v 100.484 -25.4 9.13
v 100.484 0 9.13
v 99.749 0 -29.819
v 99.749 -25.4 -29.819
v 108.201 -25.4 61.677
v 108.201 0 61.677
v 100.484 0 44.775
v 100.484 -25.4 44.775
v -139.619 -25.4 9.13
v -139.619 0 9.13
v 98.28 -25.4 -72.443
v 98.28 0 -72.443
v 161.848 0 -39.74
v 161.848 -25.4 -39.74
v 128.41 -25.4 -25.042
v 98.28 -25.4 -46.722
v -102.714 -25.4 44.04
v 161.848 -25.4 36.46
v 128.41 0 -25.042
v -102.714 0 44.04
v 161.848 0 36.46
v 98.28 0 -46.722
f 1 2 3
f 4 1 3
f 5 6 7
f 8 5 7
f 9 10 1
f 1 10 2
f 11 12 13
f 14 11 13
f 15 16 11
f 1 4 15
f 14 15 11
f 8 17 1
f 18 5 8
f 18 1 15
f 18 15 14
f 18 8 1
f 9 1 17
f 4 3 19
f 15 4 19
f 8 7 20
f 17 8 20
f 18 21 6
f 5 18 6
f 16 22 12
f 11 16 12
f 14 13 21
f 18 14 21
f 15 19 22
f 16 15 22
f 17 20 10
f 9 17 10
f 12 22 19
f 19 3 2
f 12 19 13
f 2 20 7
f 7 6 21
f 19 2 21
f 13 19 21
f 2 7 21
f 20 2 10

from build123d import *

# Parameters (mm, degrees)
F1_DEPTH = 25.4


with BuildPart() as f1:
    # F0 (on Front) → F1 (new body)
    with BuildSketch(Plane.XZ):
        Polygon((100.484227, 44.774892), (-102.714445, 44.039994), (-139.619038, 9.130239), (100.484227, 9.130239), align=None)
        Polygon((108.200631, 61.677491), (100.484227, 44.774892), (100.484227, 9.130239), (99.749338, -29.819235), (128.410263, -25.042412), (98.279542, -46.721838), (98.279542, -72.44319), (161.848029, -39.740331), (161.848029, 36.459669), align=None)
    extrude(amount=F1_DEPTH)


solid = f1.part
